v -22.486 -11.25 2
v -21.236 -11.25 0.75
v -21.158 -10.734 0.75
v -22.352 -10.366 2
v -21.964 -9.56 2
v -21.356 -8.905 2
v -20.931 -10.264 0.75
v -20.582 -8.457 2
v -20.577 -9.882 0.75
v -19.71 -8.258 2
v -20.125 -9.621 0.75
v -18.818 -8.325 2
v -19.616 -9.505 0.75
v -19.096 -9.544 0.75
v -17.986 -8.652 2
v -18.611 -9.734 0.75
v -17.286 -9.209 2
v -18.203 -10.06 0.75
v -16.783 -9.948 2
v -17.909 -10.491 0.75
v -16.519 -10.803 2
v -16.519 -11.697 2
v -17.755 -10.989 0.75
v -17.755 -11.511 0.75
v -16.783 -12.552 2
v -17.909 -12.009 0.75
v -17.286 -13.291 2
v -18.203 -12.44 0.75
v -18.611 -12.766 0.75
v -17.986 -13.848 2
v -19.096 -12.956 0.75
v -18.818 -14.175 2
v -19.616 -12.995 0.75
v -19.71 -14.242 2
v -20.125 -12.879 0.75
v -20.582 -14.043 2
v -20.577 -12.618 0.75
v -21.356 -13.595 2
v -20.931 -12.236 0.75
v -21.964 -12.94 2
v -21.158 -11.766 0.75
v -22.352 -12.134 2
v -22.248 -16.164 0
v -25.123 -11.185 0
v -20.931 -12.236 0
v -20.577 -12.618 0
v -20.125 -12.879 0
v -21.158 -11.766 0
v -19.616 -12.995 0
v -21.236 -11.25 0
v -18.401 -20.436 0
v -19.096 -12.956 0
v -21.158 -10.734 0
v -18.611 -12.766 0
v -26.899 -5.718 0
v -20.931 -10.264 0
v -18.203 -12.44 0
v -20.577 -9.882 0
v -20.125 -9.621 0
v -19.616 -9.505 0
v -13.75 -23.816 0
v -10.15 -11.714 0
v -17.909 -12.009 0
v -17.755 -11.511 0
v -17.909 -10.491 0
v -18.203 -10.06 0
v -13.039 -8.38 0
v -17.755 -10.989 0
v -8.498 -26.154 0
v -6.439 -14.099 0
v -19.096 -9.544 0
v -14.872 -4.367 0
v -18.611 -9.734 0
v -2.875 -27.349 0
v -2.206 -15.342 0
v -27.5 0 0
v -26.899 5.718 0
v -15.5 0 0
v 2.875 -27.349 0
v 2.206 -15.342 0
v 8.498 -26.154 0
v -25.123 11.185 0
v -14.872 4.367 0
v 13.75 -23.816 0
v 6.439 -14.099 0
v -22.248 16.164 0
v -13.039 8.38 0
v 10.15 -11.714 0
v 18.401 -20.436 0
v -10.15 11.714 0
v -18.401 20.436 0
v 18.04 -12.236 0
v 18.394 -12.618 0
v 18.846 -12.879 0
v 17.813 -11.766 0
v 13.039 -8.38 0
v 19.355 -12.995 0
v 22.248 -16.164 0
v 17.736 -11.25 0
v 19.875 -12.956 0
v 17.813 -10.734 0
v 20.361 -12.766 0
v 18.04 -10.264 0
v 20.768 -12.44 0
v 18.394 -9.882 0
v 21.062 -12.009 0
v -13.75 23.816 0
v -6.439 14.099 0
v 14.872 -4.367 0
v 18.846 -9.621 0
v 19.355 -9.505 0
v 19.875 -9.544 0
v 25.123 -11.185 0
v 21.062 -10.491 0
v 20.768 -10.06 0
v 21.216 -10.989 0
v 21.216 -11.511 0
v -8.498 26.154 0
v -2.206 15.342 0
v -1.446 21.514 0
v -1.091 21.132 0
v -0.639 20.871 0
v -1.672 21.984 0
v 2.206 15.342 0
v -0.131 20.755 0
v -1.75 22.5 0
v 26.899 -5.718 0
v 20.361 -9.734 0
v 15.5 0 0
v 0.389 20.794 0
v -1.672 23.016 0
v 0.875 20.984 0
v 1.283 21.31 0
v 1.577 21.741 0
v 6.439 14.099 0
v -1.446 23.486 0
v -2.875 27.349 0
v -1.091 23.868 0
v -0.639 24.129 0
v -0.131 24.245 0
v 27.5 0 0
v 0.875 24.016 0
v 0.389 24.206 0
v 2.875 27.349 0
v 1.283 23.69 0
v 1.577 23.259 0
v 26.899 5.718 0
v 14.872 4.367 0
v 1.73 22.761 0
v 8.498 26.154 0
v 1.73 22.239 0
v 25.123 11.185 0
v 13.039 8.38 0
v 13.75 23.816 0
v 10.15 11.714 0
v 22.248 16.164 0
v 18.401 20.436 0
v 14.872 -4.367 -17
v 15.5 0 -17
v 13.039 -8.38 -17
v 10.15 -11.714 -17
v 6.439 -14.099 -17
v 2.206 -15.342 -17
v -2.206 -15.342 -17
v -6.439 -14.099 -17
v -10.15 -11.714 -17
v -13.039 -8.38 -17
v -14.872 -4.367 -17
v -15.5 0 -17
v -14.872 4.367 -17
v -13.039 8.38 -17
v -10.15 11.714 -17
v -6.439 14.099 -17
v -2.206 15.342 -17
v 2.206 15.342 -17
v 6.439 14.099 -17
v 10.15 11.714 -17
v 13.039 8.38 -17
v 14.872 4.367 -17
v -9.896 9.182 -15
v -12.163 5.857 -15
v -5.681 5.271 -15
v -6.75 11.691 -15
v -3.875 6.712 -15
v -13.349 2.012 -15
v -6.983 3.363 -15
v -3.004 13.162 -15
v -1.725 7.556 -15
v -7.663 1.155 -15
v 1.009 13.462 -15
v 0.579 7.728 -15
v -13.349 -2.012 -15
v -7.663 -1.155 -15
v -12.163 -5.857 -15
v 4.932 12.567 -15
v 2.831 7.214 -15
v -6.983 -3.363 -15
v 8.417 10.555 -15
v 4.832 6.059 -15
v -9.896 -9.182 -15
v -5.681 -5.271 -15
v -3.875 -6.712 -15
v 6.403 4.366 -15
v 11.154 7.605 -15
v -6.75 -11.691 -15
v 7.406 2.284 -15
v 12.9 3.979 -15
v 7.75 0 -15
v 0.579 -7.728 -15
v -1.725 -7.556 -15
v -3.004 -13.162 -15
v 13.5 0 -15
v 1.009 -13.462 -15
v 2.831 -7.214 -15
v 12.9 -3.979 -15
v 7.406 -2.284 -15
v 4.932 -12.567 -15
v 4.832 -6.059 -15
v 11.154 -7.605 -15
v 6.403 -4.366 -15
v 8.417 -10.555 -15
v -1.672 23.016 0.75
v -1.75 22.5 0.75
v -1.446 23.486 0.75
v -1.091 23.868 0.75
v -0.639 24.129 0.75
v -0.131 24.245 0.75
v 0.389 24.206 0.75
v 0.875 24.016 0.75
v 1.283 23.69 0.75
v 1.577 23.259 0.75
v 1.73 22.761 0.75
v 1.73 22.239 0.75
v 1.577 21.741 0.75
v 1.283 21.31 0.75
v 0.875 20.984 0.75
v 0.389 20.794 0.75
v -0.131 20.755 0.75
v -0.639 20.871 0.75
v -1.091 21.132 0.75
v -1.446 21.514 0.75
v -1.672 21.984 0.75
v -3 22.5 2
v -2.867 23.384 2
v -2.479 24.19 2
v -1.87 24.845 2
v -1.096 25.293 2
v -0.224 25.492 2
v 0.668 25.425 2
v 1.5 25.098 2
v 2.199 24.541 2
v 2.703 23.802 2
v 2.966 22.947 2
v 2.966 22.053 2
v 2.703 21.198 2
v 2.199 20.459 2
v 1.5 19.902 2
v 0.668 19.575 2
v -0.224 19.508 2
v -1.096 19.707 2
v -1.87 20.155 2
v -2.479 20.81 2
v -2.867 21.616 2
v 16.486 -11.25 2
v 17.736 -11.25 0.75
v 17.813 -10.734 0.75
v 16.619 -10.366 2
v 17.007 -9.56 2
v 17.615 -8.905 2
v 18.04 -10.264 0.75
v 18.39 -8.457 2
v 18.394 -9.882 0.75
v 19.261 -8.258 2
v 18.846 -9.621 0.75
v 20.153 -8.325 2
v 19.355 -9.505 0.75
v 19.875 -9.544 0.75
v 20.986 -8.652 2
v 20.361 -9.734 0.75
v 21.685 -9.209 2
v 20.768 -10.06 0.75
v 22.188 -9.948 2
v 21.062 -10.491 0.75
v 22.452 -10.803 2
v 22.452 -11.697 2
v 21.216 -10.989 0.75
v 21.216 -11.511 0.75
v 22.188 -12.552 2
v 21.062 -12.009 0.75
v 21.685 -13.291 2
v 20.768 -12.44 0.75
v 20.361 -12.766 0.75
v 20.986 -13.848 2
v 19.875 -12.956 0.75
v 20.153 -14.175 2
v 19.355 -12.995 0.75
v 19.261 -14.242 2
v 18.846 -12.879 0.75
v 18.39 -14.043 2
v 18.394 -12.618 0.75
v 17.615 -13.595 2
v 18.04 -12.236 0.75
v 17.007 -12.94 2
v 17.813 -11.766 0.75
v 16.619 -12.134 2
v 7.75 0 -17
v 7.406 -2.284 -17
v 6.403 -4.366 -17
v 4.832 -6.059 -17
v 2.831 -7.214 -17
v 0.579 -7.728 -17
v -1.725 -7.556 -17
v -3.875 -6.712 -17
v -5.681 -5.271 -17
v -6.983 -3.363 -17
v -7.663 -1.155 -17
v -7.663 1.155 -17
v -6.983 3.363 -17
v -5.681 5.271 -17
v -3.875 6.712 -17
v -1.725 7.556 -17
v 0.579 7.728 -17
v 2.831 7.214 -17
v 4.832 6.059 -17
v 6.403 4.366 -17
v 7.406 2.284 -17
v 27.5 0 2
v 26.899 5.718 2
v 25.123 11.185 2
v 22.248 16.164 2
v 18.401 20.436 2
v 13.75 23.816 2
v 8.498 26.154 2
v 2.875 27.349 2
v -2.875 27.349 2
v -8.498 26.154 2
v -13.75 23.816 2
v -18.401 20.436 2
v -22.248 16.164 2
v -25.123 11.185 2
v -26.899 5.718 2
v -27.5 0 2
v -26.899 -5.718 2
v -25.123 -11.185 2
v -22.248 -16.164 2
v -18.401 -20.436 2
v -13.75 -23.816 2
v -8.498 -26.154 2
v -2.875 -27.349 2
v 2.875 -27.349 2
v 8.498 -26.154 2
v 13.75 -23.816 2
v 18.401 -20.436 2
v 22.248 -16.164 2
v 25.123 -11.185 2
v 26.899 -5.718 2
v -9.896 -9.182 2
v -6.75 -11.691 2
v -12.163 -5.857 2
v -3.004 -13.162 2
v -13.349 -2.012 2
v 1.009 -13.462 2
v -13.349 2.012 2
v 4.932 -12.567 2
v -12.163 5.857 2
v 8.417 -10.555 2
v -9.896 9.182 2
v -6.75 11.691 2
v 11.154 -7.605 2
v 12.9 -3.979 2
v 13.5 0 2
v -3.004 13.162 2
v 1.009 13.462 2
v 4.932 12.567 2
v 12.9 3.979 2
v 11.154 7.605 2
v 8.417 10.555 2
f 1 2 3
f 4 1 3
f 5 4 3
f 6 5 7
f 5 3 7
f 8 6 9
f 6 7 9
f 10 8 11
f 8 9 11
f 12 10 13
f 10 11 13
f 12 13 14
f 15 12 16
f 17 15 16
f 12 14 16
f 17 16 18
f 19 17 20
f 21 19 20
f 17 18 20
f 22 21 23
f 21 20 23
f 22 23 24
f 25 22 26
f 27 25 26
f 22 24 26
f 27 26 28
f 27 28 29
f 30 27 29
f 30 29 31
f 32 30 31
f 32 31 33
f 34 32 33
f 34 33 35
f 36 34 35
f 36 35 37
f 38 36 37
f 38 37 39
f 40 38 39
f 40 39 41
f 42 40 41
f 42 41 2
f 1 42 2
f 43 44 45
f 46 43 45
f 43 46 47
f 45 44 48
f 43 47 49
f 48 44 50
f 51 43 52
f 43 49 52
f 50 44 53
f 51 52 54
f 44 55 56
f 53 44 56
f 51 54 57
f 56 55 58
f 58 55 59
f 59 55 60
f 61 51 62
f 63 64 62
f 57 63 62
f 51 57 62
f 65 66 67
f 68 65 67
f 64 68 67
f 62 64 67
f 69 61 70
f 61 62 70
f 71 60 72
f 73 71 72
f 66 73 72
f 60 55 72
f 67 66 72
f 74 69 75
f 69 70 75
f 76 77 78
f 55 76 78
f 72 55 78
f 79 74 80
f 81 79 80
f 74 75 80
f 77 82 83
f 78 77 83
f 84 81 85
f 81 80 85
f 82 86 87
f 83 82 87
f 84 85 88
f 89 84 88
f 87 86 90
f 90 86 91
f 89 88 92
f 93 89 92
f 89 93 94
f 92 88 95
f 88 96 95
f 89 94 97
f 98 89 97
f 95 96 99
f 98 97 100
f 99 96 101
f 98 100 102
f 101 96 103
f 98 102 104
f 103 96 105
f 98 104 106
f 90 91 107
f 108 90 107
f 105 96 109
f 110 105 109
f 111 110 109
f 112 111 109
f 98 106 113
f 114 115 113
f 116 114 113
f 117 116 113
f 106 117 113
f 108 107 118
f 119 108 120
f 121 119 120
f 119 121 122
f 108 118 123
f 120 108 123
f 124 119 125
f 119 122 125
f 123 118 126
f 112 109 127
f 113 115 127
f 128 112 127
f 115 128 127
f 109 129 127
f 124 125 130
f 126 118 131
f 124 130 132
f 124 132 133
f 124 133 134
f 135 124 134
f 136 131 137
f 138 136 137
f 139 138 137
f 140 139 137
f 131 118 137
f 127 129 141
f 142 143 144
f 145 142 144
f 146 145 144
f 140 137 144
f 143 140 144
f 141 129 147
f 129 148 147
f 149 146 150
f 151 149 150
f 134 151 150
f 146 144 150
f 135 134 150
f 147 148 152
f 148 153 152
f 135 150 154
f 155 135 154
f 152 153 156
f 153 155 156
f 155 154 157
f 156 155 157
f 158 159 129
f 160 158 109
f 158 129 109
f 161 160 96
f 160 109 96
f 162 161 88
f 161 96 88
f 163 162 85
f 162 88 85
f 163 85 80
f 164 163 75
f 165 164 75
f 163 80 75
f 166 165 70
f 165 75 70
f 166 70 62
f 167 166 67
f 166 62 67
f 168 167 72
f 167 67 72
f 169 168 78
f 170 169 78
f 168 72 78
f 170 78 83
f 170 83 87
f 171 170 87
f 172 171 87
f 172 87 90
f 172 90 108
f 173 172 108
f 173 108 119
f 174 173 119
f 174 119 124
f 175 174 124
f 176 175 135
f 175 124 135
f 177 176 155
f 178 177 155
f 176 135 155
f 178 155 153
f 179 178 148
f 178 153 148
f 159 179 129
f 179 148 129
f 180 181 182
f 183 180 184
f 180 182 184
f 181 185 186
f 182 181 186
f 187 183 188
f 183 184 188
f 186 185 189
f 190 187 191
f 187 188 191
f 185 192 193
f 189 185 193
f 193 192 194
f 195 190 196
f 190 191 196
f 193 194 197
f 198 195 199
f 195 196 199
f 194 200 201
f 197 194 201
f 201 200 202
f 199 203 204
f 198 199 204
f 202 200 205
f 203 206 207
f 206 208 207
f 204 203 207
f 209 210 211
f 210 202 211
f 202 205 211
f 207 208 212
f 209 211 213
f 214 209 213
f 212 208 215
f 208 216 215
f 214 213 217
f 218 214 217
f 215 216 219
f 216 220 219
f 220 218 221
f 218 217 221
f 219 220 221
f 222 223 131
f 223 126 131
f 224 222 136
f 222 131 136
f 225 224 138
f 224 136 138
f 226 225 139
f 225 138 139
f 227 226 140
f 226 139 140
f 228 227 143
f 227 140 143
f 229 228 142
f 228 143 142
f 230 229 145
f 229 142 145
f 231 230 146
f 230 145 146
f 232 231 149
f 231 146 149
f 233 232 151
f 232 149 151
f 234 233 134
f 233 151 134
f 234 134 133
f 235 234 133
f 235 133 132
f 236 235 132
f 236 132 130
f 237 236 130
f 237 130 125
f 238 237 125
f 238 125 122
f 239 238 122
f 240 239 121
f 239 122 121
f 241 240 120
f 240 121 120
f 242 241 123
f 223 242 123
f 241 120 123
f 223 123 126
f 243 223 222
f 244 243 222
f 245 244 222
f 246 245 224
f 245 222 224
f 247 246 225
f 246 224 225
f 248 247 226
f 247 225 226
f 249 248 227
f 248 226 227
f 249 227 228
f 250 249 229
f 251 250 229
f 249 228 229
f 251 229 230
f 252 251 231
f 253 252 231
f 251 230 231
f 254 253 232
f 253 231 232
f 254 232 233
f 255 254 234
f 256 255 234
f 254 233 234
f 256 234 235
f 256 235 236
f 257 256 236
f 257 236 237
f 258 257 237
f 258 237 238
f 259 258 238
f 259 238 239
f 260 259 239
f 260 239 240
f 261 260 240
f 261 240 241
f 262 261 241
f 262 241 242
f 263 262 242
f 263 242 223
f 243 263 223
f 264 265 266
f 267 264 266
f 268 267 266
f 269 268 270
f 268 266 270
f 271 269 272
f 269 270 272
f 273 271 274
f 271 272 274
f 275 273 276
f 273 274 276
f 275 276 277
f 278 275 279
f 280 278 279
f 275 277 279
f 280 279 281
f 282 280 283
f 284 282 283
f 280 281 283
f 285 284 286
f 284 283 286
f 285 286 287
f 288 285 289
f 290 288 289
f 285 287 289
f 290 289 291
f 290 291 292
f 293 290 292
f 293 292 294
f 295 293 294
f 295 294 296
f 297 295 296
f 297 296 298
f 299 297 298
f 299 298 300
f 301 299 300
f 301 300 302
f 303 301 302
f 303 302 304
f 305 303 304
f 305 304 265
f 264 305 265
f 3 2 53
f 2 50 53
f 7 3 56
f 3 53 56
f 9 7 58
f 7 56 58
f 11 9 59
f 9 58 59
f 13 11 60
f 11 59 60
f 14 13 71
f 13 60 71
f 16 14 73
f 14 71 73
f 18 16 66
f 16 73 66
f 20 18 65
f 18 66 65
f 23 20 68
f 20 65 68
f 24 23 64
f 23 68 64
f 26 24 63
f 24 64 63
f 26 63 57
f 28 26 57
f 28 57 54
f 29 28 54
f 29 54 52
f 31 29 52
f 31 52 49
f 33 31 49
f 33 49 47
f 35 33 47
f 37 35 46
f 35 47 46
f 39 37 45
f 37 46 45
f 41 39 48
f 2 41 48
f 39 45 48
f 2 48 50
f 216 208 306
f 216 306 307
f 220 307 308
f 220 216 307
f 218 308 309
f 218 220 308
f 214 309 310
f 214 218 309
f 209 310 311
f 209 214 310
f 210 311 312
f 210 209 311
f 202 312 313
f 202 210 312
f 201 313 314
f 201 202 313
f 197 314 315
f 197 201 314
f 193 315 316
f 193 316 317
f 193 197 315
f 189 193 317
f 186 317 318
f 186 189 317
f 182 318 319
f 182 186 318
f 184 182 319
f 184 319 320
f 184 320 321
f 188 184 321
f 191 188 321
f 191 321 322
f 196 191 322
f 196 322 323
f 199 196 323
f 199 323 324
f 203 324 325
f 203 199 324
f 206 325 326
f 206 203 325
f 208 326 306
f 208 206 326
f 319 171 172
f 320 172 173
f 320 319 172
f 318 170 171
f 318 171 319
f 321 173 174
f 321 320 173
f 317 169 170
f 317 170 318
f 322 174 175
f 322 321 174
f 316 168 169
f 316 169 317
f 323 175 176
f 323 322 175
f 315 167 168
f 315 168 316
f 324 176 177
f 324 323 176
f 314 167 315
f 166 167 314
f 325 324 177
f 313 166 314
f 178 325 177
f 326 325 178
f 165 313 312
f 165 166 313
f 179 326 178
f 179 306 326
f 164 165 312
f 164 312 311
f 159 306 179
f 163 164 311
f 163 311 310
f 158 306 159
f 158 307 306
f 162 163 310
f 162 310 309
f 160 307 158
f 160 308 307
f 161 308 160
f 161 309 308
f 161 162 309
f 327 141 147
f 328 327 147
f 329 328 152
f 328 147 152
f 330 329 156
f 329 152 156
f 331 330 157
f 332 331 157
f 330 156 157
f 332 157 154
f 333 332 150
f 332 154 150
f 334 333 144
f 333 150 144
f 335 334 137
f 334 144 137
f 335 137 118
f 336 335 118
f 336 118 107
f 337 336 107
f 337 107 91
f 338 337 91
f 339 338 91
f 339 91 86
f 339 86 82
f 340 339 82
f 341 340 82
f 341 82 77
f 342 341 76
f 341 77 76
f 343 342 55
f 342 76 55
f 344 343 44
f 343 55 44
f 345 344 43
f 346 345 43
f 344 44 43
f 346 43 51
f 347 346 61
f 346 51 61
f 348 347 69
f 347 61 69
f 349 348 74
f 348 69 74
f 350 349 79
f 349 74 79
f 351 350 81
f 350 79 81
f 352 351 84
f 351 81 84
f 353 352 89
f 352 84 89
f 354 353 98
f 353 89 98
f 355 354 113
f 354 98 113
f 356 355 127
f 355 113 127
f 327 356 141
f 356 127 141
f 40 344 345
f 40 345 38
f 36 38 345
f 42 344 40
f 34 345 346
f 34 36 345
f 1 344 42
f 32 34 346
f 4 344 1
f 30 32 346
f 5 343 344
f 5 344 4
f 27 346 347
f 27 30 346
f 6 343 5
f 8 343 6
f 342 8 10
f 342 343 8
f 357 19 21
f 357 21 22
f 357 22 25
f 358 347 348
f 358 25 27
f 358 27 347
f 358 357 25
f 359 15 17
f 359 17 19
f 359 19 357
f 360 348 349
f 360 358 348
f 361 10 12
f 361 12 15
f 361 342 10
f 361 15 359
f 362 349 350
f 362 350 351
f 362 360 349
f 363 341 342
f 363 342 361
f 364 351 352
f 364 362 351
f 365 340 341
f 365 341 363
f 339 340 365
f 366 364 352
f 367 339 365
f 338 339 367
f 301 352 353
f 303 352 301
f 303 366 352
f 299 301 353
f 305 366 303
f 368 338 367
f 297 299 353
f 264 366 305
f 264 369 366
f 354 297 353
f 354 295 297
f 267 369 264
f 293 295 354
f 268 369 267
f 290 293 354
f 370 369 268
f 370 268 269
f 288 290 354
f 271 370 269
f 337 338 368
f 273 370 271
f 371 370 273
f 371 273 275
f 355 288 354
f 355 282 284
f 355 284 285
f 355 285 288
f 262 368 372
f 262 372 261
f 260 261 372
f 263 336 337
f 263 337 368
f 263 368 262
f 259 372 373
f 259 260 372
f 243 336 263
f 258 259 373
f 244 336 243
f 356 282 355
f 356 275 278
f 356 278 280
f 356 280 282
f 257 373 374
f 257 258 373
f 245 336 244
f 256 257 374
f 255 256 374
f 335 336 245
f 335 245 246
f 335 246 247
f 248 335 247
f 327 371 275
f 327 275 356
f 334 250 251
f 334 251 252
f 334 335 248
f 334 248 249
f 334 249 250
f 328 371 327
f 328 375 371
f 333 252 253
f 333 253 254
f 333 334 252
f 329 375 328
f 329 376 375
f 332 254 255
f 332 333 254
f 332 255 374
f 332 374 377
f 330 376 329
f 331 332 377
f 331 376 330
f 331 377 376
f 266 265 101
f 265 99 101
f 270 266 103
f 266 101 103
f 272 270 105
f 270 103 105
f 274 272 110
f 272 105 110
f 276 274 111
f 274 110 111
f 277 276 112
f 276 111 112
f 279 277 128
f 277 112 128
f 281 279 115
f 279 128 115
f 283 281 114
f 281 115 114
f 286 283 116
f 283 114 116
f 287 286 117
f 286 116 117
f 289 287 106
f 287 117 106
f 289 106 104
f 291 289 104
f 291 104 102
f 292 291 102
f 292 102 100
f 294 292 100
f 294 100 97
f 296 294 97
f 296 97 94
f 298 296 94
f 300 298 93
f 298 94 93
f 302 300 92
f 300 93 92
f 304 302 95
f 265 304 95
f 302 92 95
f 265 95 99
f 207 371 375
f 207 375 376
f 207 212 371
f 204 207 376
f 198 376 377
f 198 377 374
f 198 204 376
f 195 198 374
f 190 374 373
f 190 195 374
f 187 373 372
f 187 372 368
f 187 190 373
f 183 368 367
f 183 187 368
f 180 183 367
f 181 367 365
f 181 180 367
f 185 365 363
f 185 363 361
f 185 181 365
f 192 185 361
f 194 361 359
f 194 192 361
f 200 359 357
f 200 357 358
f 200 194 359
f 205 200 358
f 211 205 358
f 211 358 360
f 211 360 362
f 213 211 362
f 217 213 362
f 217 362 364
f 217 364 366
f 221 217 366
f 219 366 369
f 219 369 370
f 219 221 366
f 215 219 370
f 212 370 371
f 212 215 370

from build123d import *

# Parameters (mm, degrees)
F0_R           = 15.5
F0_R_2         = 13.5
F1_DEPTH       = 15
F2_R           = 27.5
F2_R_2         = 13.5
F3_DEPTH       = 2
F4_R           = 15.5
F4_R_2         = 7.75
F5_DEPTH       = 2
F7_D           = 3.5
F7_CSINK_D     = 6
F7_CSINK_ANGLE = 90


with BuildPart() as f1:
    # F0 (on Top) → F1 (new body)
    with BuildSketch(Plane.XY):
        Circle(F0_R)
        Circle(F0_R_2, mode=Mode.SUBTRACT)
    extrude(amount=-F1_DEPTH)

    # F2 (on Top) → F3 (join)
    with BuildSketch(Plane.XY):
        Circle(F2_R)
        Circle(F2_R_2, mode=Mode.SUBTRACT)
    extrude(amount=F3_DEPTH)

    # F4 (on face) → F5 (join)
    with BuildSketch(Plane(origin=(0, 0, -15), x_dir=(1, 0, 0), z_dir=(0, 0, -1))):
        Circle(F4_R)
        Circle(F4_R_2, mode=Mode.SUBTRACT)
    extrude(amount=F5_DEPTH)

    # F7 (through all)
    with Locations(Plane.XY.offset(2)):
        with Locations((0, 22.5), (-19.485572, -11.25), (19.485572, -11.25)):
            CounterSinkHole(F7_D / 2, F7_CSINK_D / 2, counter_sink_angle=F7_CSINK_ANGLE)


solid = f1.part
